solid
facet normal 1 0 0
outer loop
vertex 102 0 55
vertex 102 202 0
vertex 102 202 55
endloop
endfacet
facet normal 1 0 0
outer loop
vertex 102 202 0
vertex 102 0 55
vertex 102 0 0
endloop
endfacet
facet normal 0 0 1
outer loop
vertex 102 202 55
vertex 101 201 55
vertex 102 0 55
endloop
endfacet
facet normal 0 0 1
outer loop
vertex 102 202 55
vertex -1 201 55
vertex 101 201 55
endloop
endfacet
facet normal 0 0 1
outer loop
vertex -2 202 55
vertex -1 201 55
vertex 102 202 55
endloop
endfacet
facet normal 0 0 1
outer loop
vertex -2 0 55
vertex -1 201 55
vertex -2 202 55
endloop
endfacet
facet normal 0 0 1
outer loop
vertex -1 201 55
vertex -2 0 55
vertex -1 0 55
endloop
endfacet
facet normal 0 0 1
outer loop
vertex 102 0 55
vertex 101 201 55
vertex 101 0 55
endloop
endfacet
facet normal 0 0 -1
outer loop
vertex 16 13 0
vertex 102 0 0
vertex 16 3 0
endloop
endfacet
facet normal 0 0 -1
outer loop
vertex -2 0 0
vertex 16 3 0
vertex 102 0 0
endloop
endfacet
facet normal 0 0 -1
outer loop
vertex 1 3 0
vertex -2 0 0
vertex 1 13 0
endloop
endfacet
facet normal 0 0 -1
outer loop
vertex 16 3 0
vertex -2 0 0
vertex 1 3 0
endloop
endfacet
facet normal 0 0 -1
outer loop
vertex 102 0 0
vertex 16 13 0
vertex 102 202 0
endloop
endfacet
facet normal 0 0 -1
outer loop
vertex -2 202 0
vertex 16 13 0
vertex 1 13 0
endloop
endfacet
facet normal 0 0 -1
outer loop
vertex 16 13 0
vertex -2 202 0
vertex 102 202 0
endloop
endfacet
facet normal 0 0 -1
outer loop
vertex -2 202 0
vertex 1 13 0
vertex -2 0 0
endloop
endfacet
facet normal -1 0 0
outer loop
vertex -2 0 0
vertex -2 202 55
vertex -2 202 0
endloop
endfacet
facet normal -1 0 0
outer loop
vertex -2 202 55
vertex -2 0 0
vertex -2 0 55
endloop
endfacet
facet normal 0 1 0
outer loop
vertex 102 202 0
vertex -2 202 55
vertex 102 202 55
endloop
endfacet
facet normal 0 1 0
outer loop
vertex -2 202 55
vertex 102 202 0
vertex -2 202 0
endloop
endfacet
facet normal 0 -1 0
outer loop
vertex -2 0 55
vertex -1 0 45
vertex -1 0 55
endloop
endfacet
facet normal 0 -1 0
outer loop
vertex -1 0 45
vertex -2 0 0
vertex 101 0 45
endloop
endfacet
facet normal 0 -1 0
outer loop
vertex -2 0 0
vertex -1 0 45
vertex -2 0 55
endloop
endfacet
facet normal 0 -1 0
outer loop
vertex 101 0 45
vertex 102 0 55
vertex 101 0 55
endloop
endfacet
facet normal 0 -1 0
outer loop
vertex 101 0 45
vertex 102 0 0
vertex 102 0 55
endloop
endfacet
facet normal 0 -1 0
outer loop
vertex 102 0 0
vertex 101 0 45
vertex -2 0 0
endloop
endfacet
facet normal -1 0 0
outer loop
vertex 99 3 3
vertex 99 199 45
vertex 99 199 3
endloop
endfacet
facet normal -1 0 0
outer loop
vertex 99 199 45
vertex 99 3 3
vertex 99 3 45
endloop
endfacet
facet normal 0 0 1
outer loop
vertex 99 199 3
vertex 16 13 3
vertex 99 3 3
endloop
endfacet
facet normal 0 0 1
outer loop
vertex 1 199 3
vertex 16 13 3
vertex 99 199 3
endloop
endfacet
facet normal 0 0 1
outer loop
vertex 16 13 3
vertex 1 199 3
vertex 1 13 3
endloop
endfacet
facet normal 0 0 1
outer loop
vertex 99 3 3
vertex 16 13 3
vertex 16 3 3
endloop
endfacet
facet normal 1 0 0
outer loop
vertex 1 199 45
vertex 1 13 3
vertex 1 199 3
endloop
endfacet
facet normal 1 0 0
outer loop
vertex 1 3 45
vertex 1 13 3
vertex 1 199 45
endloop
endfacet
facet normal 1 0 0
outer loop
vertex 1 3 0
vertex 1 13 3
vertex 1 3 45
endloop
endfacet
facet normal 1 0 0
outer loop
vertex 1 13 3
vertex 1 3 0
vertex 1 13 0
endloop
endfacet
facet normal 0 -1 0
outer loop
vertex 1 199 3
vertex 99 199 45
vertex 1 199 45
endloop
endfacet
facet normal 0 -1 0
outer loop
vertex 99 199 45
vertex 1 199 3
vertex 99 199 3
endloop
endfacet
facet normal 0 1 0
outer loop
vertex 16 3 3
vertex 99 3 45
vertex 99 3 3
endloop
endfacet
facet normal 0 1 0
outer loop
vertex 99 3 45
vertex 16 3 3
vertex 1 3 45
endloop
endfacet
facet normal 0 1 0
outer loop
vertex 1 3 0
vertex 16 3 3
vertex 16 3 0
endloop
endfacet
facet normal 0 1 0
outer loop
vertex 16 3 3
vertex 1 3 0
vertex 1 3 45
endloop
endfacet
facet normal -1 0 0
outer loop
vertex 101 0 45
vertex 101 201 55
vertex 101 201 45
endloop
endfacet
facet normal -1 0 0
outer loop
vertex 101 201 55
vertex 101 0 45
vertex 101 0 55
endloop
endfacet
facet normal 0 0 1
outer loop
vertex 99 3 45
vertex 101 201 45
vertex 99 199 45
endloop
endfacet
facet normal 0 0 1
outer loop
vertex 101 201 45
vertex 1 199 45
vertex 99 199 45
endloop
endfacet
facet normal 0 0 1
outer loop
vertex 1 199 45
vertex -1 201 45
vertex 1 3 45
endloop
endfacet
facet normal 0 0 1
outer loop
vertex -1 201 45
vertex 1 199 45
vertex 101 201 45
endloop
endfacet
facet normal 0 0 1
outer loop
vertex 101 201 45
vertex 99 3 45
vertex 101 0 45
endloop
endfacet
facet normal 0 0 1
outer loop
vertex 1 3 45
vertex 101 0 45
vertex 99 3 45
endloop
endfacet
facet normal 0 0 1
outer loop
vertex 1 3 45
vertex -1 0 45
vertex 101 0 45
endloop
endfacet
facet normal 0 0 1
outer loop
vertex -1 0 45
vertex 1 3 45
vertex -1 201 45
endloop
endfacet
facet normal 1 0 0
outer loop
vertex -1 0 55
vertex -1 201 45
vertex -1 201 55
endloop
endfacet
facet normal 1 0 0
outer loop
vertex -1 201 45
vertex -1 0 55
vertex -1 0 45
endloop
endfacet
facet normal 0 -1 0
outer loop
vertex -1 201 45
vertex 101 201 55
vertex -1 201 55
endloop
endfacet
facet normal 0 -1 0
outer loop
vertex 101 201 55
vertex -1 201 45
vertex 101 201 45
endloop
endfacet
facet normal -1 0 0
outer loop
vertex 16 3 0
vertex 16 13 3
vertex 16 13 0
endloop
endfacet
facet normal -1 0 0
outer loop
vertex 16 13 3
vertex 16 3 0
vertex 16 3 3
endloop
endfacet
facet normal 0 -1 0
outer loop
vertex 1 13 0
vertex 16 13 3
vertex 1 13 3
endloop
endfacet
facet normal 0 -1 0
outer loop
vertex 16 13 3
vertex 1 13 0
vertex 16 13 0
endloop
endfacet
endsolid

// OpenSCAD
//building facade
height=200;
width=100;
thick=3;
windows_across=4;
window_space=width/windows_across;
window_width=15;
floors=4;
room_depth=60;
led_tube_diam=13;
led_tube_len=20;
back_depth=40;

floor_heights=[60,50,50,30];
floor_window_frac=[0.6,0.6,0.6,0.6];
floor_window_offset=[8,8,8,8];

module window_sub(floor,from,to,n) {
    translate([n*window_space+(window_space-window_width)/2,from+floor_window_offset[floor],-1]) union() {
        if (floor>0) {
            cube([window_width,(to-from)*floor_window_frac[floor],thick+4]); //window hole
        }
        if (floor==0) {
            if (n==2) {
          translate([0,-6,0]) cube([window_width,(to-from)*floor_window_frac[floor],thick+4]); //bottom window hole
            translate([window_width/2,30,0]) linear_extrude(height=thick+4) circle(d=window_width,$fn=100); //bottom window oval                
            } else {
            cube([window_width,(to-from)*floor_window_frac[floor]-5,thick+4]); //bottom window hole
            translate([window_width/2,30,0]) linear_extrude(height=thick+4) circle(d=window_width,$fn=100); //bottom window oval
            }
        }
    }
}

module window_add(floor,from,to,n) {
    window_height=(to-from)*floor_window_frac[floor];
   if (floor>0 || n!=2) {    
    translate([n*window_space+(window_space-window_width)/2+1,from+4,thick]) cube([window_width-2,3,thick]); //window boxes
 
    translate([n*window_space+(window_space-window_width)/2,from+7,thick]) cube([window_width,1,thick+1]);  //window sill  
    }
    if (floor==3) {
        translate([n*window_space+(window_space-window_width)/2,from+floor_window_offset[floor]+(to-from)*0.3-0.5,0]) cube([window_width,1,thick-1]); //top window horizontal
        translate([n*window_space+(window_space-window_width)/2+window_width/2-0.5,from+floor_window_offset[floor],0]) cube([1,(to-from)*floor_window_frac[floor],thick-1]); //top window vertical   
    } else {
     translate([n*window_space+(window_space-window_width)/2,from+floor_window_offset[floor]+(to-from)*floor_window_frac[floor]/3-0.5,0]) cube([window_width,1,thick-1]); //window bottom horizontal
     if (floor==0 && n==2) {
    translate([n*window_space+(window_space-window_width)/2,from+floor_window_offset[floor]+(to-from)*0-0.5,0]) cube([window_width,1,thick-1]); //window bottom horizontal         
     }
    translate([n*window_space+(window_space-window_width)/2,from+floor_window_offset[floor]+(to-from)*floor_window_frac[floor]/3*2-0.5,0]) cube([window_width,1,thick-1]); //window top horizontal       
        translate([n*window_space+(window_space-window_width)/2+window_width/2-0.5,from+floor_window_offset[floor]-8,0]) cube([1,(to-from)*floor_window_frac[floor]+20,thick-1]);//window bottom vertical            
    }
    if (floor>0) {
        translate([0,2,0])
        difference() {
            translate([n*window_space+(window_space-window_width)/2-2,from+window_height+4,thick]) union() {
                if (floor==3) {
                     translate([0,0.51,0]) cube([window_width+4,0.2*window_height,thick]); //top window cover
                } else {
                cube([window_width+4,0.2*window_height-2,thick]); //window cover
                translate([window_width/2+2,4,0]) linear_extrude(height=thick) resize([window_width+4,10]) circle(d=window_width+4,$fn=100); //window cover oval
                }
            };
            translate([0,-2,1]) window_sub(floor,from,to,n);
        }
    }
    
}

function get_from(floor) = (floor==0 ? 0 : floor_heights[floor-1]+get_from(floor-1));

function get_to(floor) = (floor==0 ? floor_heights[0] : floor_heights[floor]+get_to(floor-1));

module floor_add(n,from,to) {
        if (from>0) translate([0,from,thick]) cube([width,3,thick]);
        for(i=[0:windows_across-1]) {
            window_add(n,from,to,i); //add window parts
        }
}

module floor_sub(n,from,to) {
        for(i=[0:windows_across-1]) {  
            window_sub(n,from,to,i); //subtract window parts
        }
}

module facade() {
    difference() {
        cube([width,height,thick]); //make the floor
        for(i=[0:floors-1]) {
            floor_sub(i,get_from(i),get_to(i)); //perform the subtracts
        } 
    }
    for(i=[0:floors-1]) {
        floor_add(i,get_from(i),get_to(i));  //perform the adds
    }      
}

module rooms() {
    room_width=(width-5*thick)/windows_across;
    difference() {
        union() {
    difference() {
        cube([width,height,room_depth]);
        for(i=[0:floors-1]) {
            for(j=[0:windows_across-1]) {
                translate([thick+j*(room_width+thick),thick+get_from(i),thick]) 
                if (i==3) {
                    cube([room_width,get_to(i)-get_from(i)-1.5*thick+8,room_depth-thick+1]);    
                } else {
                    cube([room_width,get_to(i)-get_from(i)-1.5*thick,room_depth-thick+1]);
                }
            }
        }
    }
    for(i=[0:floors-1]) {
            for(j=[0:windows_across-1]) {  
                  if (i==3) {
   translate([thick+j*(room_width+thick)+room_width/2,thick+get_from(i)+(get_to(i)-get_from(i)-1.5*thick+8)/2,thick])
       cylinder(d=led_tube_diam+3,h=led_tube_len,$fn=100);                      
      
   
                  } else {
                  translate([thick+j*(room_width+thick)+room_width/2,thick+get_from(i)+(get_to(i)-get_from(i)-1.5*thick)/2,thick]) 
                      cylinder(d=led_tube_diam+3,h=led_tube_len,$fn=100);
                     
                 
                  }
            }
    }
}
  for(i=[0:floors-1]) {
            for(j=[0:windows_across-1]) {  
                  if (i==3) {
   translate([thick+j*(room_width+thick)+room_width/2,thick+get_from(i)+(get_to(i)-get_from(i)-1.5*thick+8)/2,thick])                    
       translate([0,0,-thick-5]) cylinder(d=led_tube_diam,h=led_tube_len+thick+10,$fn=100);
   
                  } else {
                  translate([thick+j*(room_width+thick)+room_width/2,thick+get_from(i)+(get_to(i)-get_from(i)-1.5*thick)/2,thick]) 
                      translate([0,0,-thick-5]) cylinder(d=led_tube_diam,h=led_tube_len+thick+10,$fn=100);
                  
                  }
            }
    }
}
}

module test_cylinder() {
    difference() {
         cylinder(d=led_tube_diam+3,h=led_tube_len,$fn=100);
         translate([0,0,-thick-5]) cylinder(d=led_tube_diam,h=led_tube_len+thick+10,$fn=100);        
    }
}

module back_cover() {
       border=2;
       overlap=10;
       translate([-border,0,0]) difference() {
        cube([width+2*border,height+border,back_depth+overlap+border+thick]);
        translate([thick,thick,thick]) cube([width+2*border-thick*2,height+border-thick*2,back_depth+overlap+border+1]);  
        translate([border-1,-1,back_depth+border+thick]) cube([width+2,height+2,overlap+1]);
        translate([thick,thick,-1]) cube([15,10,10]);
       }
}

//translate([0,0,room_depth+50]) facade();
//facade();
//translate([0,0,46]) rooms();
//test_cylinder();
back_cover();
